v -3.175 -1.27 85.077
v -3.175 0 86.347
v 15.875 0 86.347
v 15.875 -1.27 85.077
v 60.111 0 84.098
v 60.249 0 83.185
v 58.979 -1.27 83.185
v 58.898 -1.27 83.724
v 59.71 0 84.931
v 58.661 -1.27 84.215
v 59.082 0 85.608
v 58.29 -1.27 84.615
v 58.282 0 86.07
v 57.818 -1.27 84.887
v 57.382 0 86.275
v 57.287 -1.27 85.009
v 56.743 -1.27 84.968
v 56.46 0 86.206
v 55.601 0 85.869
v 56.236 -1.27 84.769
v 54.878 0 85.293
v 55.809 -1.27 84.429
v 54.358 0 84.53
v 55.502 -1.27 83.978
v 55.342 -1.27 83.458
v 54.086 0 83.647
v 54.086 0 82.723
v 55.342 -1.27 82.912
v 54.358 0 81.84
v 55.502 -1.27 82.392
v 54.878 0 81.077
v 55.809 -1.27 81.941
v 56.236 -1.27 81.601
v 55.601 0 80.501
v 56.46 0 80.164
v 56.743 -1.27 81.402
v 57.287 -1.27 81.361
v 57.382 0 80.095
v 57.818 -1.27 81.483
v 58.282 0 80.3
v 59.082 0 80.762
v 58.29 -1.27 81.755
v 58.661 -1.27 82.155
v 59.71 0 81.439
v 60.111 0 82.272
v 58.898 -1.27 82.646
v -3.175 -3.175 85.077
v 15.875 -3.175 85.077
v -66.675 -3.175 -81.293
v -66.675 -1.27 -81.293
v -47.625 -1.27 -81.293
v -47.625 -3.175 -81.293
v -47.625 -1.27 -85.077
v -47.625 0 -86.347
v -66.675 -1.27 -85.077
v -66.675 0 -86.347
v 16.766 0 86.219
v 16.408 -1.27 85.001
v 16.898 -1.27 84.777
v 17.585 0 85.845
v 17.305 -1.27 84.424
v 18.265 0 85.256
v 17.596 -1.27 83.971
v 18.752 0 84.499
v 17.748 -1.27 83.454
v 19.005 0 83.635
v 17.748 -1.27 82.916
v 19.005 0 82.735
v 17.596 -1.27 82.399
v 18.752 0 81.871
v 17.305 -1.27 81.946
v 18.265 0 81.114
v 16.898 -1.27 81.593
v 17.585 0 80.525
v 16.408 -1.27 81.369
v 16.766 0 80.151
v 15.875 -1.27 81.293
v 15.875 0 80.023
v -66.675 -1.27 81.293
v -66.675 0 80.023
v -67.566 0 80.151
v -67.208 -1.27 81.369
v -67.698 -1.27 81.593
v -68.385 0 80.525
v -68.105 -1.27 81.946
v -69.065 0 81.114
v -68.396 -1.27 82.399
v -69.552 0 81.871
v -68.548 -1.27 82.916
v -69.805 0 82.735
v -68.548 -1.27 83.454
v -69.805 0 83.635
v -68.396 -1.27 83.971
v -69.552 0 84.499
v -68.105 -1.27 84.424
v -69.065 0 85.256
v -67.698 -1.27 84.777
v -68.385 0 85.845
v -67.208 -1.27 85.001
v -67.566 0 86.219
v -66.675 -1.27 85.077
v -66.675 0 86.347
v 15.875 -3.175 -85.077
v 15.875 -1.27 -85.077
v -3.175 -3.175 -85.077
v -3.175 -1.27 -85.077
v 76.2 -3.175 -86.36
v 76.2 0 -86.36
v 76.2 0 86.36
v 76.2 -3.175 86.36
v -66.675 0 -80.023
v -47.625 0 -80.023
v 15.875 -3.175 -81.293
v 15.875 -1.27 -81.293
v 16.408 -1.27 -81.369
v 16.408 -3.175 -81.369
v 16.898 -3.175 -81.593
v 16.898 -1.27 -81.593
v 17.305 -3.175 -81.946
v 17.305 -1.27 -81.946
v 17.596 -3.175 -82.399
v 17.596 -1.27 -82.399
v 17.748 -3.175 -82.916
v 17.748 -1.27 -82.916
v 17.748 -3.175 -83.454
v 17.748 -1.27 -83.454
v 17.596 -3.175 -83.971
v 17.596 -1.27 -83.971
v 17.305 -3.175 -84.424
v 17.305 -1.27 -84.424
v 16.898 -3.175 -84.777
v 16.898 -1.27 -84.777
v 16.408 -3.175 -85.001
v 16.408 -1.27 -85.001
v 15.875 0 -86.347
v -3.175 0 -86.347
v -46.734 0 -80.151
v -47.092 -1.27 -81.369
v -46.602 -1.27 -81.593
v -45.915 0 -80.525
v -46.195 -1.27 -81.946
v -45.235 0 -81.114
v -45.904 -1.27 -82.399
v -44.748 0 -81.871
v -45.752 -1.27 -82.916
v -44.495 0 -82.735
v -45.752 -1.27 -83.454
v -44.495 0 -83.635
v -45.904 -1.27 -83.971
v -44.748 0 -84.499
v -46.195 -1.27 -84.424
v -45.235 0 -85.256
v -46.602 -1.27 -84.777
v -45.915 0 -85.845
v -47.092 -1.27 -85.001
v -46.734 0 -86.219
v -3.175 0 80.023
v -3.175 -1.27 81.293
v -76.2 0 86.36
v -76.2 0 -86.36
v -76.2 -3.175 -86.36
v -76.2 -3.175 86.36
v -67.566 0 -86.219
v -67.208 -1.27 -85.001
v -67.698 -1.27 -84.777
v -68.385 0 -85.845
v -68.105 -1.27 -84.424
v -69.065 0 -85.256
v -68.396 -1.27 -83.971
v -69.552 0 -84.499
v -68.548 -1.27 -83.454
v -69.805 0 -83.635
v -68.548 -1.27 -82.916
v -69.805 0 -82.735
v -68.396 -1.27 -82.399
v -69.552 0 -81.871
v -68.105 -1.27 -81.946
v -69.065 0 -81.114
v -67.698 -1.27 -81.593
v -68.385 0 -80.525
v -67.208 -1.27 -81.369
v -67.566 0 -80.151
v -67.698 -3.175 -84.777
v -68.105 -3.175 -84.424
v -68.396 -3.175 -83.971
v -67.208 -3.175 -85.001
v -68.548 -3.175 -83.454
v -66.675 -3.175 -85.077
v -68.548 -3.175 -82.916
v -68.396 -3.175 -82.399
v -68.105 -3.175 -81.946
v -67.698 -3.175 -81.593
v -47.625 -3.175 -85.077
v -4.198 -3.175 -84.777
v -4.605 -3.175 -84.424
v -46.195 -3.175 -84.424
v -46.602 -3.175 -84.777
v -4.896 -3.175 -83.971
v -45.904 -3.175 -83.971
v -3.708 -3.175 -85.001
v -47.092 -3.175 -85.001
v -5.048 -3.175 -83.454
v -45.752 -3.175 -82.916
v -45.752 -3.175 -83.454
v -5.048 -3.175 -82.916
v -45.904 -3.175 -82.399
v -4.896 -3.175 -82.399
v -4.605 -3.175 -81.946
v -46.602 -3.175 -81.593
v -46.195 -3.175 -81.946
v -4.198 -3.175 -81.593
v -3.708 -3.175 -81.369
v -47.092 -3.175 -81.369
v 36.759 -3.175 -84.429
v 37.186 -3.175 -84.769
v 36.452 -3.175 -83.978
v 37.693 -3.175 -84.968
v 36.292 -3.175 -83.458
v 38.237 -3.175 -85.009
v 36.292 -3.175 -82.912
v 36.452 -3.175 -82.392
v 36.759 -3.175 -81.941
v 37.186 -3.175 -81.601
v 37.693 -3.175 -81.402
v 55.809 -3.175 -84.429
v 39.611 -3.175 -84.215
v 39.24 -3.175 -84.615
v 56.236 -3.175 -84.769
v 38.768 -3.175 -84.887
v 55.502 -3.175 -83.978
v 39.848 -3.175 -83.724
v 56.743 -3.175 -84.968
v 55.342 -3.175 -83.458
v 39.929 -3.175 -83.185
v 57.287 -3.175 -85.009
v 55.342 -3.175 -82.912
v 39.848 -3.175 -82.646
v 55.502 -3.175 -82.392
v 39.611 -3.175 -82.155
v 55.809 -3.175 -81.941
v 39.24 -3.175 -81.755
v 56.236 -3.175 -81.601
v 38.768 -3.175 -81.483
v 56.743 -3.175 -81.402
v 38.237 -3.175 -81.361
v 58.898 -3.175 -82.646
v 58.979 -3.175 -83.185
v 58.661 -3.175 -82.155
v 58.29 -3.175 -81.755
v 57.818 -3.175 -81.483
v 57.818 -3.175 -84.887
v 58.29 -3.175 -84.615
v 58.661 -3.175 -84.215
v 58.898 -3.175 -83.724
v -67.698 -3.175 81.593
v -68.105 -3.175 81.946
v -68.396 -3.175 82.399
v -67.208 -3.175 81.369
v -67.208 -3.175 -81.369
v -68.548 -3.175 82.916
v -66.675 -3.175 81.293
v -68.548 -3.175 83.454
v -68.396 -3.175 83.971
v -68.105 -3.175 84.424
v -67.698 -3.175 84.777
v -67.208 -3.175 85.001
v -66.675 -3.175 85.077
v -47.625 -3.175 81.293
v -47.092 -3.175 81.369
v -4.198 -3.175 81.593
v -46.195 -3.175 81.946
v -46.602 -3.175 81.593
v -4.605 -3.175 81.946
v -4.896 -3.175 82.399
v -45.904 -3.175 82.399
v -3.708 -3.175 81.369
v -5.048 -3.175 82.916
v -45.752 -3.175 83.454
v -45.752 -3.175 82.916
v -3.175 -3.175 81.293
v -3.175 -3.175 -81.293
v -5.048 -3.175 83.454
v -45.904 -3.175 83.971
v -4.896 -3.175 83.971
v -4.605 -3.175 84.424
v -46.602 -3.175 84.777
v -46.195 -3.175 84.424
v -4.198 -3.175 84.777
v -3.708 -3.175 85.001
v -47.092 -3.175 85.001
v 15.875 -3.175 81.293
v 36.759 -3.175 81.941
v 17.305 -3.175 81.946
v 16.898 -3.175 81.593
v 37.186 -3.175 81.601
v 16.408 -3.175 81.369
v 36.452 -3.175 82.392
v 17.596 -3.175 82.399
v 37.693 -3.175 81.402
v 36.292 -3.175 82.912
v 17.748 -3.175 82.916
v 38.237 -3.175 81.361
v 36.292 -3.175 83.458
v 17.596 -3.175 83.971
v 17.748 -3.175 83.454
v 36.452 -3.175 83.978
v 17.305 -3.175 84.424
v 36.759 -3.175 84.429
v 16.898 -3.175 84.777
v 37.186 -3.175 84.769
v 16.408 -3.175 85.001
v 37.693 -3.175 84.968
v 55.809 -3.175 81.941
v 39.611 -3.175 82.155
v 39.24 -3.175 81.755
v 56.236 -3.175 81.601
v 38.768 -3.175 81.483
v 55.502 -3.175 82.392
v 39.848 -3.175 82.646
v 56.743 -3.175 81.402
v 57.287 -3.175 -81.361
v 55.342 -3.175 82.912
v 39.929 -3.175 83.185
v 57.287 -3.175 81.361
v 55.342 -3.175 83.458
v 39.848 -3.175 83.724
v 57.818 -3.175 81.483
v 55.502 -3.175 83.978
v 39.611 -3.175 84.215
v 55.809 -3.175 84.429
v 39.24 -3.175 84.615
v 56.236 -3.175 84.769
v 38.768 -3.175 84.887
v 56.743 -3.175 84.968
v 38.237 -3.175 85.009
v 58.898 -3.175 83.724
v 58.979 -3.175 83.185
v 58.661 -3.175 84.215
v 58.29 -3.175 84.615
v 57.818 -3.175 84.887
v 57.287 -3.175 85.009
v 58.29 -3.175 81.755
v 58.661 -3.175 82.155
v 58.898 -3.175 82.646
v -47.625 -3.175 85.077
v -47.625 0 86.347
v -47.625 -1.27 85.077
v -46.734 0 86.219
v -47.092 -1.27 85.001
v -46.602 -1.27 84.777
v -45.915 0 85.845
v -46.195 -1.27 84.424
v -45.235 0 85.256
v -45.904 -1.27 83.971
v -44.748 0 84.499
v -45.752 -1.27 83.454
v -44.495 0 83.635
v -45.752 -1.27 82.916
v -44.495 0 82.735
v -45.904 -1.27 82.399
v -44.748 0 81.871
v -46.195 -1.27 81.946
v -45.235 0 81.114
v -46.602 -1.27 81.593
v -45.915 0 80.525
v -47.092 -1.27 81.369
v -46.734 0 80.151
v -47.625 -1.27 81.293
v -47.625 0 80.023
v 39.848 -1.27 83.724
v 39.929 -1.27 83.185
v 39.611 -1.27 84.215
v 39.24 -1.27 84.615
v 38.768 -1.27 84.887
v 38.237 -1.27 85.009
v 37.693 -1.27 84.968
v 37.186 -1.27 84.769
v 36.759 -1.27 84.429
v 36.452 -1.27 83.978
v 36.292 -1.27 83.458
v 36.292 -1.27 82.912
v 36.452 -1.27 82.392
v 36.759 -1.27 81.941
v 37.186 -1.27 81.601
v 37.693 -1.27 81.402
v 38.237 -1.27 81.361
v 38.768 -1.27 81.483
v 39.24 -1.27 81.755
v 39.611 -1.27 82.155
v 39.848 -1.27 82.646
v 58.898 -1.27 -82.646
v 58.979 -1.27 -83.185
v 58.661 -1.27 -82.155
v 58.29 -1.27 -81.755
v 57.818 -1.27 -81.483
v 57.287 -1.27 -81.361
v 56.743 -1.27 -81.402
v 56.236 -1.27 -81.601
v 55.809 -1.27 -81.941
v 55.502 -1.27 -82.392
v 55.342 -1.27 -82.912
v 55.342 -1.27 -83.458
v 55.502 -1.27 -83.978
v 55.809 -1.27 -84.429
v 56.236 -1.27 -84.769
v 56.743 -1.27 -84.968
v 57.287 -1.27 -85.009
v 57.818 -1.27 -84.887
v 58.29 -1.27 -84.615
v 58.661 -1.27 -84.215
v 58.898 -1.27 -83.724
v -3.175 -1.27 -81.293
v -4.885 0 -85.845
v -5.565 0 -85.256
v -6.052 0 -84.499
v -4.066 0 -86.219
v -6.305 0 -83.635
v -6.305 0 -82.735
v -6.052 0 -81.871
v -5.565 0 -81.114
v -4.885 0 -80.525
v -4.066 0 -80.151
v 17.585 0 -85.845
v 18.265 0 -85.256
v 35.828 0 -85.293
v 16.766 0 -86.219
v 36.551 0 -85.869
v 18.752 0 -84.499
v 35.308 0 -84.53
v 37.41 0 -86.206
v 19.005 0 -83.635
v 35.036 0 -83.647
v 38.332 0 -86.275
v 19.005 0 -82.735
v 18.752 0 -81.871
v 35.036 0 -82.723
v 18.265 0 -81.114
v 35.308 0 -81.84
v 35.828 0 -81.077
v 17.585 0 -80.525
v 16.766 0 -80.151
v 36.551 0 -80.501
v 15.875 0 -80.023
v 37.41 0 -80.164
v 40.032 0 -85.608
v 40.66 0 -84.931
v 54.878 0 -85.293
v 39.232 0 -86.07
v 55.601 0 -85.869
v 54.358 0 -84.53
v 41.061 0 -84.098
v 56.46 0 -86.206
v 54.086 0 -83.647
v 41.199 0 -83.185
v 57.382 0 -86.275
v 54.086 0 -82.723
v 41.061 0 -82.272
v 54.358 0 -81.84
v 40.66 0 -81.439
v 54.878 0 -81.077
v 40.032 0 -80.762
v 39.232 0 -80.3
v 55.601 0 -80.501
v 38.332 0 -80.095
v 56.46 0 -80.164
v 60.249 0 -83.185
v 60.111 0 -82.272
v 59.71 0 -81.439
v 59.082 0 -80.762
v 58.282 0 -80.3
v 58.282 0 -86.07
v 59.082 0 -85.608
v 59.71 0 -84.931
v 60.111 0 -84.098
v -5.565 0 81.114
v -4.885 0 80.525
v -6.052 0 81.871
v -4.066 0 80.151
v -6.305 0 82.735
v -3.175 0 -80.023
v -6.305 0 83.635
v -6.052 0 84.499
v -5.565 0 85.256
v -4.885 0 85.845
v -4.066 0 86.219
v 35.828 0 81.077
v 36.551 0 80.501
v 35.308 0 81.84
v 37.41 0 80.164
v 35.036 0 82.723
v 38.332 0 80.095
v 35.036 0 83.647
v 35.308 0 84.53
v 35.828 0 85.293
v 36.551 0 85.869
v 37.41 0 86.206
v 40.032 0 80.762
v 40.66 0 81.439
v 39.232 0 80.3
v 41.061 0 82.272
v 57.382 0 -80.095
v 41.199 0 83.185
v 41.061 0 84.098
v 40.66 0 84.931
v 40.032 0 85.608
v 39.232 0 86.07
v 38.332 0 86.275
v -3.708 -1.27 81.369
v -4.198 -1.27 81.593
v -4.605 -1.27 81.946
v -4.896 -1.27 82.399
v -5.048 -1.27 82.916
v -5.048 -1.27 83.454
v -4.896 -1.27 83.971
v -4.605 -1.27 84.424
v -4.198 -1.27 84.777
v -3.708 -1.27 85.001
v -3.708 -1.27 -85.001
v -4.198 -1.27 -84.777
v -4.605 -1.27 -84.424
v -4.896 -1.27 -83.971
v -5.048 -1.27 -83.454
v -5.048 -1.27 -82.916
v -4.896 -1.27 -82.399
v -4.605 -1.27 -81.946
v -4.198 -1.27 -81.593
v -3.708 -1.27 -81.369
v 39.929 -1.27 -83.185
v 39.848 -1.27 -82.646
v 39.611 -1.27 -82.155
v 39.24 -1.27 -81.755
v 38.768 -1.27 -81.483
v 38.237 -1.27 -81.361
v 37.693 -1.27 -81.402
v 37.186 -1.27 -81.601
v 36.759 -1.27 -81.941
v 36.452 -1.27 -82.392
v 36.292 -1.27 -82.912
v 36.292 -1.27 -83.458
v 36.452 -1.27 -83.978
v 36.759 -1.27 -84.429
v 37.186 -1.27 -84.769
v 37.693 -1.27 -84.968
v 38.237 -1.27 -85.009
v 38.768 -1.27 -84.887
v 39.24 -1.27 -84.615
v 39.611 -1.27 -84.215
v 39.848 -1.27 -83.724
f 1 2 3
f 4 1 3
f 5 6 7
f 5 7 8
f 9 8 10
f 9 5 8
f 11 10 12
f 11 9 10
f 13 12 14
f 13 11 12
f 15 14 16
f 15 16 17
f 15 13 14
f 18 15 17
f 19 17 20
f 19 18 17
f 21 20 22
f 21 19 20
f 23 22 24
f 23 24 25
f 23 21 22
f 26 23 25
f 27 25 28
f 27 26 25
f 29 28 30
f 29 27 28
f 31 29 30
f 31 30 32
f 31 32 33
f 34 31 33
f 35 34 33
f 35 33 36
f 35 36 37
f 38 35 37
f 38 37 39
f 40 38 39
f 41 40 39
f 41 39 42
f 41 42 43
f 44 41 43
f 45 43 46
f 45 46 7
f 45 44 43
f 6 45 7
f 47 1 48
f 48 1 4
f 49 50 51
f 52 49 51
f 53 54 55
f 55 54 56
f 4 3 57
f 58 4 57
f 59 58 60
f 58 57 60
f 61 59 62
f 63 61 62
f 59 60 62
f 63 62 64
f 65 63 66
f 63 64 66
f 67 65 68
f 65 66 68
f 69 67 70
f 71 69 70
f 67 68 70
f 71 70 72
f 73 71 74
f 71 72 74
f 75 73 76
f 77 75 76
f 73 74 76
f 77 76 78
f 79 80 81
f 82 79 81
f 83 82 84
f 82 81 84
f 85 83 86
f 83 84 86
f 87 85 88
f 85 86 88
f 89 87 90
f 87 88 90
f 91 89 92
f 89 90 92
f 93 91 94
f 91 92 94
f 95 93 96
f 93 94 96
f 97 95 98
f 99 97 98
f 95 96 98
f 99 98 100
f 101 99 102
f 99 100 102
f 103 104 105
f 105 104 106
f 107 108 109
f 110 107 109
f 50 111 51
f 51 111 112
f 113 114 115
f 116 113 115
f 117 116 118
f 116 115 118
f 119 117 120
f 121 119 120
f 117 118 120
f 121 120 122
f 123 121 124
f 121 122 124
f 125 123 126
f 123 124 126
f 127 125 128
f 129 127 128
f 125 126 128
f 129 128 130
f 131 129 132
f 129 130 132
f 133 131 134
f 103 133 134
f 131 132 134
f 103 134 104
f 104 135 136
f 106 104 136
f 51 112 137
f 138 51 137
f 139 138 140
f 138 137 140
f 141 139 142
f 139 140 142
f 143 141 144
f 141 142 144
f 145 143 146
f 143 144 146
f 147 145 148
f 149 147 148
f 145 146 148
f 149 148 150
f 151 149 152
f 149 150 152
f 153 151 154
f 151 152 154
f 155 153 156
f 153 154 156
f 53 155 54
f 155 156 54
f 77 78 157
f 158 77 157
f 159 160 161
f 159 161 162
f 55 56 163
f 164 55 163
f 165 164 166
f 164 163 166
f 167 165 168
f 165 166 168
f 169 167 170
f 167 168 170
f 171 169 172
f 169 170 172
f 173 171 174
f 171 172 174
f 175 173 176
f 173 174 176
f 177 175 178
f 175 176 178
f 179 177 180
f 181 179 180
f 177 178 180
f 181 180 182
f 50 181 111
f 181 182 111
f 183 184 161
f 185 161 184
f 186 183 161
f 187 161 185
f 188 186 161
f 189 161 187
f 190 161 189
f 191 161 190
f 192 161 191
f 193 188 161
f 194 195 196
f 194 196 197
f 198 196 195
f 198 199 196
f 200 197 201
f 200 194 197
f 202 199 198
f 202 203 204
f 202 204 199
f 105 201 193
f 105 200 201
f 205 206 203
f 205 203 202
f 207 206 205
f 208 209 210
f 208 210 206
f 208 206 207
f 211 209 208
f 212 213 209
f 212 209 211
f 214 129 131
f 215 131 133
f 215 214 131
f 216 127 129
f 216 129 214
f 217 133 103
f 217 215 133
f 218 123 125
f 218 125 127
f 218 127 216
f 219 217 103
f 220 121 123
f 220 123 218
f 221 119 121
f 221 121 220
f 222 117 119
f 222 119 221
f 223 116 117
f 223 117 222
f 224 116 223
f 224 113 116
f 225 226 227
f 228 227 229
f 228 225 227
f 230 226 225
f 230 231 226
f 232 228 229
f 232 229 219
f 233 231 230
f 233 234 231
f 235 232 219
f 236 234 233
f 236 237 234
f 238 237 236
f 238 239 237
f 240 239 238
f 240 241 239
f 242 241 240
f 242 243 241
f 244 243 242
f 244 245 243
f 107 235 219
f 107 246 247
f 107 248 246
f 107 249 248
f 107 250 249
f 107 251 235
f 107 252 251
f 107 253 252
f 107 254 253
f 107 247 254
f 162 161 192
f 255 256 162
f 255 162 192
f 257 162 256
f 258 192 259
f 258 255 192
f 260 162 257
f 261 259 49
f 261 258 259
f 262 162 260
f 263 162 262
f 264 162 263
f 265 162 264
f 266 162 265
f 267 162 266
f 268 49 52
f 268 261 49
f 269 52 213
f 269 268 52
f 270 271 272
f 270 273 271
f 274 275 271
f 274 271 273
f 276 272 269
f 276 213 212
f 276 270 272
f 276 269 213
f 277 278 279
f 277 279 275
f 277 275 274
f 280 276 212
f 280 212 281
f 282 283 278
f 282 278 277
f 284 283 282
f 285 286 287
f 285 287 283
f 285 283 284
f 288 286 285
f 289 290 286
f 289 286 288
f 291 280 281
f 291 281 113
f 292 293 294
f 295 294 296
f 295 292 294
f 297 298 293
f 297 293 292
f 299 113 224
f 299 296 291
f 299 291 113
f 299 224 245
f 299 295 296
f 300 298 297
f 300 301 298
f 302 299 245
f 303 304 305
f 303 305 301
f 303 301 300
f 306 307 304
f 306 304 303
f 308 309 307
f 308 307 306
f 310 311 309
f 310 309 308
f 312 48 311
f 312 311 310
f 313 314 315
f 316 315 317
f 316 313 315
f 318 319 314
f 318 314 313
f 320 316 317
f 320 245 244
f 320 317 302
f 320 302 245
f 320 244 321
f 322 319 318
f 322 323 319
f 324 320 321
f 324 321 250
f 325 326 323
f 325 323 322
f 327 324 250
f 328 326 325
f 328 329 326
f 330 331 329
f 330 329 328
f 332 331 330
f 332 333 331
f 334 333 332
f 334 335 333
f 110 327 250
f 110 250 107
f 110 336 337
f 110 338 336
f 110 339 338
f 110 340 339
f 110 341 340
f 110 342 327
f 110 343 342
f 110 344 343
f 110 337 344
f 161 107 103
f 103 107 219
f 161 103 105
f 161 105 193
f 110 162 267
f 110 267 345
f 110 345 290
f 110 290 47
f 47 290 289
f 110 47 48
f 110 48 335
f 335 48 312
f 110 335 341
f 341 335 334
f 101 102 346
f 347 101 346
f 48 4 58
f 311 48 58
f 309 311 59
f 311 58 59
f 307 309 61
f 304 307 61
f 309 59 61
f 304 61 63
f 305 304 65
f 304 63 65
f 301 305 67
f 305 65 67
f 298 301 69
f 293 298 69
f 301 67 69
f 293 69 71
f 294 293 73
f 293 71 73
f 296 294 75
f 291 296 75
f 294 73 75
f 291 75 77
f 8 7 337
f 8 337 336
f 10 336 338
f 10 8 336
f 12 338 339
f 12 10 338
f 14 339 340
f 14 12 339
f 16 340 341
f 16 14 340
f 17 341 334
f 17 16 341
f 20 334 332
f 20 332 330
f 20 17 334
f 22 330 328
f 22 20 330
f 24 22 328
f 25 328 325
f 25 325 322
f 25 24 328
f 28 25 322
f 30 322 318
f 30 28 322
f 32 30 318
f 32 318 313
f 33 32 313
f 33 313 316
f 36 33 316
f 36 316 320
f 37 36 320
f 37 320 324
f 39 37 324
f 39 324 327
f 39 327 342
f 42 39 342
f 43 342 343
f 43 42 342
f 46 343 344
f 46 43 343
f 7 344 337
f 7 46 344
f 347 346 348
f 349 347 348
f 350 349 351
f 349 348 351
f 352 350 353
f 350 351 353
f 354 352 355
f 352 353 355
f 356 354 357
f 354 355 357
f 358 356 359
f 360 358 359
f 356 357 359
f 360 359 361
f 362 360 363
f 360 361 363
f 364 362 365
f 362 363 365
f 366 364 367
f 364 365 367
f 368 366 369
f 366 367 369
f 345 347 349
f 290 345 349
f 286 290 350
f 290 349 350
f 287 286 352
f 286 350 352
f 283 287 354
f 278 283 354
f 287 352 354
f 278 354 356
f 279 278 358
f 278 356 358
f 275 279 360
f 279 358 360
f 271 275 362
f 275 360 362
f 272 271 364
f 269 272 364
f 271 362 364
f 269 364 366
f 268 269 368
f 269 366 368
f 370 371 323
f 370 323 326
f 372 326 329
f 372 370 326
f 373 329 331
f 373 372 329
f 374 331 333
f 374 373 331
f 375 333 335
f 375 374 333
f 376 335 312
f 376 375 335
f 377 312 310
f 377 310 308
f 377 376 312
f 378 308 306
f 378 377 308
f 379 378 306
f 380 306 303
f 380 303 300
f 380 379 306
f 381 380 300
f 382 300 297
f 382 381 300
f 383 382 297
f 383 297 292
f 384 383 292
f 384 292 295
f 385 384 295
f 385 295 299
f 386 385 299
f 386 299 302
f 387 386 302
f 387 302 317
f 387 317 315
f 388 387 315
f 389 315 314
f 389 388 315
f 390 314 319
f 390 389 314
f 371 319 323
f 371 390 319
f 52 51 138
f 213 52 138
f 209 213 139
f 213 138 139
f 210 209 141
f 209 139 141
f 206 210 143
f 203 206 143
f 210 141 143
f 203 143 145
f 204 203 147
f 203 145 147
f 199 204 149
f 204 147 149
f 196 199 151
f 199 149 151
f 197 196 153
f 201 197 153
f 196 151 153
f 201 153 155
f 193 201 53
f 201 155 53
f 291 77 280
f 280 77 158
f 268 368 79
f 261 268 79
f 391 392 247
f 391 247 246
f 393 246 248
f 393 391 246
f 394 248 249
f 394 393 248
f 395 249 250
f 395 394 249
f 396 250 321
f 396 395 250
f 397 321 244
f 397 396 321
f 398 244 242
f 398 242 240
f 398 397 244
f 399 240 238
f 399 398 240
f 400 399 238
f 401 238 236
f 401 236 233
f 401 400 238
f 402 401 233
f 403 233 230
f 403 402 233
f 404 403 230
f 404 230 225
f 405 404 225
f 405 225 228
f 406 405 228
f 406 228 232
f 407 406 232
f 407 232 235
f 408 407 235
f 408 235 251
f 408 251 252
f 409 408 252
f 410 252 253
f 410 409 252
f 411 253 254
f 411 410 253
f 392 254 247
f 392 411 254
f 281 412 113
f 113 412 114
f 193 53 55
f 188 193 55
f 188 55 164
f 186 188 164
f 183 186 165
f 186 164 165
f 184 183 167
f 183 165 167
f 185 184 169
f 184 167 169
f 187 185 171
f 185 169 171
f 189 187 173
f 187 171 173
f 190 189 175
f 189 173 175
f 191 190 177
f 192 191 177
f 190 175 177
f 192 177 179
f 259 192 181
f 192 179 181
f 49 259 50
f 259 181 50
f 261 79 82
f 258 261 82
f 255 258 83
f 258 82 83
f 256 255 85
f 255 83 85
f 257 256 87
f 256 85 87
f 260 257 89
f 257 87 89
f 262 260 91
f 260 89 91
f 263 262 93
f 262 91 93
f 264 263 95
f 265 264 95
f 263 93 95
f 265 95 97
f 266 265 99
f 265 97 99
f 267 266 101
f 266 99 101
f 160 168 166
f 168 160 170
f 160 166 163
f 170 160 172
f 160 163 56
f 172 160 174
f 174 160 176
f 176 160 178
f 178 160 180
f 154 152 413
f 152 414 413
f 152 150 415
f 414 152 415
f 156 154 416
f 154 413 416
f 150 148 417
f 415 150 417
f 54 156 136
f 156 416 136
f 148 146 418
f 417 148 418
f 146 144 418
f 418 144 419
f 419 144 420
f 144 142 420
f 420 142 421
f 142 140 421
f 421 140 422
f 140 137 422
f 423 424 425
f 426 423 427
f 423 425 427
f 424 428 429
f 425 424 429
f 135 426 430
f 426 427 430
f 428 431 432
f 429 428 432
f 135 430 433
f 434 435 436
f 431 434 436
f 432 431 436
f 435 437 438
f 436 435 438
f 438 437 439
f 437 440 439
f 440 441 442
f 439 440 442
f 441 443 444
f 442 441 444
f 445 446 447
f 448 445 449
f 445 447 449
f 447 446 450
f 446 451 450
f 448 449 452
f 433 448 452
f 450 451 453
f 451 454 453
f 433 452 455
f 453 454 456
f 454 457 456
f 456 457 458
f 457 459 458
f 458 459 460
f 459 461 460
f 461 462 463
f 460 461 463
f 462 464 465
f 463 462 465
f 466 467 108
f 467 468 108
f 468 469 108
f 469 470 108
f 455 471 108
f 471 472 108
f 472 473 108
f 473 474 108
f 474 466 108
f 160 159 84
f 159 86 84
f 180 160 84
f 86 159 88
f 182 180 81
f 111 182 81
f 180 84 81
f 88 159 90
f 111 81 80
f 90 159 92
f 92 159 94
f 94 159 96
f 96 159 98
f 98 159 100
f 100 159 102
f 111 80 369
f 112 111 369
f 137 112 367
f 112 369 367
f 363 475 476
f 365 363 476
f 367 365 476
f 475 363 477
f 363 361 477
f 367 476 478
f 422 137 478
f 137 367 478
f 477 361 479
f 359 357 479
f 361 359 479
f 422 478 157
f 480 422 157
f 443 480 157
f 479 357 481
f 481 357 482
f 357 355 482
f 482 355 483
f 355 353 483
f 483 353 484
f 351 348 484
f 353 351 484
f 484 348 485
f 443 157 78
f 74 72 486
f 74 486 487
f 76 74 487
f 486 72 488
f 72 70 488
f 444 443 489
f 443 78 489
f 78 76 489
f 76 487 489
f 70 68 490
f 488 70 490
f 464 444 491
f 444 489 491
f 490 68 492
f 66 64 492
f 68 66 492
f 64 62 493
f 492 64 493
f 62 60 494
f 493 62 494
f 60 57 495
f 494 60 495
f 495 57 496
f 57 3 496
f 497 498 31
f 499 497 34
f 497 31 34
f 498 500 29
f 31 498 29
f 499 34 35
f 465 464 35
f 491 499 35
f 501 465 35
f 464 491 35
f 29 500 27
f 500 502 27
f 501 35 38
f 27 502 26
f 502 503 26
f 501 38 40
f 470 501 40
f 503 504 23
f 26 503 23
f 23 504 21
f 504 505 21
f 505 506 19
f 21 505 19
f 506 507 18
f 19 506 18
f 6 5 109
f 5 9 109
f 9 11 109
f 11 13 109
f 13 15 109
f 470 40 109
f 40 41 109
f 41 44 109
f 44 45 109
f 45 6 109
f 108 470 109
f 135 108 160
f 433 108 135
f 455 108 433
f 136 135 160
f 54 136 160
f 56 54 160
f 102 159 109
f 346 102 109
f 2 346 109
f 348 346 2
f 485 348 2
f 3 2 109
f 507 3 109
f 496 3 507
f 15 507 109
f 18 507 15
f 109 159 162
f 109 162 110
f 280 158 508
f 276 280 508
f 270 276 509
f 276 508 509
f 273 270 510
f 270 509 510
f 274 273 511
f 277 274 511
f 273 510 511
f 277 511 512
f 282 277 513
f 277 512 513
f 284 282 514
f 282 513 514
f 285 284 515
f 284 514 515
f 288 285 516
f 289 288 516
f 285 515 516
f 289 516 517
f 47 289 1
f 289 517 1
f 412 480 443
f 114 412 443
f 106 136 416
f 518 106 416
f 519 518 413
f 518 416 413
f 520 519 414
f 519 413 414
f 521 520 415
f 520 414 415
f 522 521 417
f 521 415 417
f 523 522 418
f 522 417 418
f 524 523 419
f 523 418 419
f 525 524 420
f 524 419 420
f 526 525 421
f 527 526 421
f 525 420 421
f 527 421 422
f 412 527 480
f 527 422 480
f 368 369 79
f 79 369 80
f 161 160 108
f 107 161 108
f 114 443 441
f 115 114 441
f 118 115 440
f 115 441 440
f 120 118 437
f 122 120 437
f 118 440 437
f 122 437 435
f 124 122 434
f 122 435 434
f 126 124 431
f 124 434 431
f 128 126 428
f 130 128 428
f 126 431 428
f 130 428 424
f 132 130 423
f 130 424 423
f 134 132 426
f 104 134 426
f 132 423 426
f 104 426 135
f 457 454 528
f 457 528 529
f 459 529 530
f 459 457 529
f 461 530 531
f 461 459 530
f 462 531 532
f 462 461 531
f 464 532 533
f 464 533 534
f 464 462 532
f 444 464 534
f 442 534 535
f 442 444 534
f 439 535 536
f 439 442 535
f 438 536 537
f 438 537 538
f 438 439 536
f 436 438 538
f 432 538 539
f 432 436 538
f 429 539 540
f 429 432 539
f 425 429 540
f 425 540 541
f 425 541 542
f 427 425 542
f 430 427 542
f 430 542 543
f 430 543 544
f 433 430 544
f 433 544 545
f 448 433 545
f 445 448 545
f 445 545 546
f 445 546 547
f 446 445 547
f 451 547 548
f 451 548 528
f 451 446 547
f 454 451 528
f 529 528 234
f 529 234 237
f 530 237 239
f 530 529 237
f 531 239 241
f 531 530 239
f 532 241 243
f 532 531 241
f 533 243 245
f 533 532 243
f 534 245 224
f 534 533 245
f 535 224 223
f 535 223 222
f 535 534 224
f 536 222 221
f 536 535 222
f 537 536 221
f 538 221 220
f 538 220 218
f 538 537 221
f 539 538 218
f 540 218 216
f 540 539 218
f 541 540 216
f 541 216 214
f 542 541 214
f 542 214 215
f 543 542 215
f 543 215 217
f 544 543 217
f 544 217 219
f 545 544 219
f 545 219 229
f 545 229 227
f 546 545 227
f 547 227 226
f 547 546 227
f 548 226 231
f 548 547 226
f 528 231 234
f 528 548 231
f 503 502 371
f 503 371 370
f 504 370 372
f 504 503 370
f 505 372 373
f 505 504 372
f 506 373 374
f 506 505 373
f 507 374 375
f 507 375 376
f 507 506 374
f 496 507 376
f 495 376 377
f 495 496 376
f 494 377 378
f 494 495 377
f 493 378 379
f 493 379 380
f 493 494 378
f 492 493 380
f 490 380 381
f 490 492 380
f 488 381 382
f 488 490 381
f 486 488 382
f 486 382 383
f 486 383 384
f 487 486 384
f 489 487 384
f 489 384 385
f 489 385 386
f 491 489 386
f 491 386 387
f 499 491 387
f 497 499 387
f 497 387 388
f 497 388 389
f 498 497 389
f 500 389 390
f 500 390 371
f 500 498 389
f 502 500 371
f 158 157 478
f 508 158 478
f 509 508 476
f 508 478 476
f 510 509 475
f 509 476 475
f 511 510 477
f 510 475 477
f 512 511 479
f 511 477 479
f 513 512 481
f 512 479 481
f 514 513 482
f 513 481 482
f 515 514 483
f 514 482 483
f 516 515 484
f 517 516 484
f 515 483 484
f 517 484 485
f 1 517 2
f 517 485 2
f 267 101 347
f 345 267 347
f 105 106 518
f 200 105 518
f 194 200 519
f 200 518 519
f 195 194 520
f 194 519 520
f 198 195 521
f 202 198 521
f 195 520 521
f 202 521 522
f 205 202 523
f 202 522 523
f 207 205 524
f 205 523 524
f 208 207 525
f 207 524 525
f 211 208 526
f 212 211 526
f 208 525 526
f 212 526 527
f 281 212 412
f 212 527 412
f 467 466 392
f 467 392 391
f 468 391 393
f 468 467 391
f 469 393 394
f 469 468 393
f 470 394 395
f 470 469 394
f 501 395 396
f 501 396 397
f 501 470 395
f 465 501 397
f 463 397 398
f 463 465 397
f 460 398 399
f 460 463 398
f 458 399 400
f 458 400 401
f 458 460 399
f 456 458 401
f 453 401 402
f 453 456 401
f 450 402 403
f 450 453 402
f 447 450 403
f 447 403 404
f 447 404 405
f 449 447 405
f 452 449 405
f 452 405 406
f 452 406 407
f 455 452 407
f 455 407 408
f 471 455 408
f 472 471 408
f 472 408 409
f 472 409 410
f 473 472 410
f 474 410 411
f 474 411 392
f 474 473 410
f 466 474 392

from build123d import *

# Parameters (mm, degrees)
F0_W     = 152.4
F0_H     = 172.72
F0_R     = 1.8288
F1_DEPTH = 3.175
F2_SIZE  = 1.27


with BuildPart() as f1:
    # F0 (on Front) → F1 (new body)
    with BuildSketch(Plane.XZ):
        Rectangle(F0_W, F0_H)
        with BuildLine():
            ThreePointArc((-66.675, -85.0773), (-68.5673, -83.185), (-66.675, -81.2927))
            Line((-66.675, -81.2927), (-47.625, -81.2927))
            ThreePointArc((-47.625, -81.2927), (-45.7327, -83.185), (-47.625, -85.0773))
            Line((-47.625, -85.0773), (-66.675, -85.0773))
        make_face(mode=Mode.SUBTRACT)
        with BuildLine():
            Line((15.875, -85.0773), (-3.175, -85.0773))
            ThreePointArc((-3.175, -85.0773), (-5.0673, -83.185), (-3.175, -81.2927))
            Line((-3.175, -81.2927), (15.875, -81.2927))
            ThreePointArc((15.875, -81.2927), (17.7673, -83.185), (15.875, -85.0773))
        make_face(mode=Mode.SUBTRACT)
        with Locations((38.1, -83.185)):
            Circle(F0_R, mode=Mode.SUBTRACT)
        with Locations((57.15, -83.185)):
            Circle(F0_R, mode=Mode.SUBTRACT)
        with BuildLine():
            Line((-66.675, 85.0773), (-47.625, 85.0773))
            ThreePointArc((-47.625, 85.0773), (-45.7327, 83.185), (-47.625, 81.2927))
            Line((-47.625, 81.2927), (-66.675, 81.2927))
            ThreePointArc((-66.675, 81.2927), (-68.5673, 83.185), (-66.675, 85.0773))
        make_face(mode=Mode.SUBTRACT)
        with BuildLine():
            ThreePointArc((-3.175, 81.2927), (-5.0673, 83.185), (-3.175, 85.0773))
            Line((-3.175, 85.0773), (15.875, 85.0773))
            ThreePointArc((15.875, 85.0773), (17.7673, 83.185), (15.875, 81.2927))
            Line((15.875, 81.2927), (-3.175, 81.2927))
        make_face(mode=Mode.SUBTRACT)
        with Locations((38.1, 83.185)):
            Circle(F0_R, mode=Mode.SUBTRACT)
        with Locations((57.15, 83.185)):
            Circle(F0_R, mode=Mode.SUBTRACT)
    extrude(amount=F1_DEPTH)

    # F2
    f2_edges = [f1.edges().sort_by_distance(p)[0] for p in [
        (55.3212, 0, 83.185),
        (36.2712, 0, 83.185),
        (17.7673, 0, 83.185),
        (6.35, 0, 85.0773),
        (-5.0673, 0, 83.185),
        (6.35, 0, 81.2927),
        (-45.7327, 0, 83.185),
        (-57.15, 0, 85.0773),
        (-57.15, 0, 81.2927),
        (-68.5673, 0, 83.185),
        (-57.15, 0, -81.2927),
        (-45.7327, 0, -83.185),
        (-57.15, 0, -85.0773),
        (-68.5673, 0, -83.185),
        (-5.0673, 0, -83.185),
        (6.35, 0, -81.2927),
        (17.7673, 0, -83.185),
        (6.35, 0, -85.0773),
        (36.2712, 0, -83.185),
        (55.3212, 0, -83.185),
    ]]
    chamfer(f2_edges, length=F2_SIZE)


solid = f1.part
